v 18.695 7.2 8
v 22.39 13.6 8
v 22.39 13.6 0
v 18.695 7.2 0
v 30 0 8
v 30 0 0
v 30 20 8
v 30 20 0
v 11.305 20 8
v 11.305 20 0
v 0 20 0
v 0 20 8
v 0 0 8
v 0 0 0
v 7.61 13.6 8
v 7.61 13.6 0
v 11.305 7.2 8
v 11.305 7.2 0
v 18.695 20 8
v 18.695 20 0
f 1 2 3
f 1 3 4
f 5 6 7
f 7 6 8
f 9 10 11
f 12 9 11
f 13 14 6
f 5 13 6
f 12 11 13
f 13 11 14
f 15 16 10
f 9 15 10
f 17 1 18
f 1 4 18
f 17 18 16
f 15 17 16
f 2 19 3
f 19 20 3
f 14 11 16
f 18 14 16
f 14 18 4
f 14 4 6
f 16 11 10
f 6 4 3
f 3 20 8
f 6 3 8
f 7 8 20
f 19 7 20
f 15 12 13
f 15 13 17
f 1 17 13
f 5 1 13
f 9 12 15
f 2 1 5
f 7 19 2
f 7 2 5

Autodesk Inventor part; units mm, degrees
ref_plane "YZ Plane" through (0, 0, 0) normal (1, 0, 0) x (0, 1, 0)
ref_plane "XZ Plane" through (0, 0, 0) normal (0, 1, 0) x (-1, 0, 0)
ref_plane "XY Plane" through (0, 0, 0) normal (0, 0, 1) x (1, 0, 0)
sketch "Sketch1" plane through (0, 0, 0) normal (0, 0, 1) x (1, 0, 0)
  line L0 (0, 0) -> (30, 0)
  line L1 (30, 0) -> (30, 20)
  line L2 (30, 20) -> (0, 20)
  line L3 (0, 20) -> (0, 0)
  line L4 (11.305, 7.2) -> (7.6099, 13.6)
  line L5 (7.6099, 13.6) -> (11.305, 20)
  line L6 (11.305, 20) -> (18.695, 20)
  line L7 (18.695, 20) -> (22.3901, 13.6)
  line L8 (22.3901, 13.6) -> (18.695, 7.2)
  line L9 (18.695, 7.2) -> (11.305, 7.2)
  point P0 (15, 13.6)
  dimension "d0" = 30
  dimension "d1" = 20
  dimension "d2" = 12.8
  dimension "d3" = 0
  dimension "d4" = 15
extrude "Extrusion1" add sketch "Sketch1" along normal blind 8 contours L3 L2 L5 L4 L9 L8 L7 L1 L0
properties part number "piulita telescop"
